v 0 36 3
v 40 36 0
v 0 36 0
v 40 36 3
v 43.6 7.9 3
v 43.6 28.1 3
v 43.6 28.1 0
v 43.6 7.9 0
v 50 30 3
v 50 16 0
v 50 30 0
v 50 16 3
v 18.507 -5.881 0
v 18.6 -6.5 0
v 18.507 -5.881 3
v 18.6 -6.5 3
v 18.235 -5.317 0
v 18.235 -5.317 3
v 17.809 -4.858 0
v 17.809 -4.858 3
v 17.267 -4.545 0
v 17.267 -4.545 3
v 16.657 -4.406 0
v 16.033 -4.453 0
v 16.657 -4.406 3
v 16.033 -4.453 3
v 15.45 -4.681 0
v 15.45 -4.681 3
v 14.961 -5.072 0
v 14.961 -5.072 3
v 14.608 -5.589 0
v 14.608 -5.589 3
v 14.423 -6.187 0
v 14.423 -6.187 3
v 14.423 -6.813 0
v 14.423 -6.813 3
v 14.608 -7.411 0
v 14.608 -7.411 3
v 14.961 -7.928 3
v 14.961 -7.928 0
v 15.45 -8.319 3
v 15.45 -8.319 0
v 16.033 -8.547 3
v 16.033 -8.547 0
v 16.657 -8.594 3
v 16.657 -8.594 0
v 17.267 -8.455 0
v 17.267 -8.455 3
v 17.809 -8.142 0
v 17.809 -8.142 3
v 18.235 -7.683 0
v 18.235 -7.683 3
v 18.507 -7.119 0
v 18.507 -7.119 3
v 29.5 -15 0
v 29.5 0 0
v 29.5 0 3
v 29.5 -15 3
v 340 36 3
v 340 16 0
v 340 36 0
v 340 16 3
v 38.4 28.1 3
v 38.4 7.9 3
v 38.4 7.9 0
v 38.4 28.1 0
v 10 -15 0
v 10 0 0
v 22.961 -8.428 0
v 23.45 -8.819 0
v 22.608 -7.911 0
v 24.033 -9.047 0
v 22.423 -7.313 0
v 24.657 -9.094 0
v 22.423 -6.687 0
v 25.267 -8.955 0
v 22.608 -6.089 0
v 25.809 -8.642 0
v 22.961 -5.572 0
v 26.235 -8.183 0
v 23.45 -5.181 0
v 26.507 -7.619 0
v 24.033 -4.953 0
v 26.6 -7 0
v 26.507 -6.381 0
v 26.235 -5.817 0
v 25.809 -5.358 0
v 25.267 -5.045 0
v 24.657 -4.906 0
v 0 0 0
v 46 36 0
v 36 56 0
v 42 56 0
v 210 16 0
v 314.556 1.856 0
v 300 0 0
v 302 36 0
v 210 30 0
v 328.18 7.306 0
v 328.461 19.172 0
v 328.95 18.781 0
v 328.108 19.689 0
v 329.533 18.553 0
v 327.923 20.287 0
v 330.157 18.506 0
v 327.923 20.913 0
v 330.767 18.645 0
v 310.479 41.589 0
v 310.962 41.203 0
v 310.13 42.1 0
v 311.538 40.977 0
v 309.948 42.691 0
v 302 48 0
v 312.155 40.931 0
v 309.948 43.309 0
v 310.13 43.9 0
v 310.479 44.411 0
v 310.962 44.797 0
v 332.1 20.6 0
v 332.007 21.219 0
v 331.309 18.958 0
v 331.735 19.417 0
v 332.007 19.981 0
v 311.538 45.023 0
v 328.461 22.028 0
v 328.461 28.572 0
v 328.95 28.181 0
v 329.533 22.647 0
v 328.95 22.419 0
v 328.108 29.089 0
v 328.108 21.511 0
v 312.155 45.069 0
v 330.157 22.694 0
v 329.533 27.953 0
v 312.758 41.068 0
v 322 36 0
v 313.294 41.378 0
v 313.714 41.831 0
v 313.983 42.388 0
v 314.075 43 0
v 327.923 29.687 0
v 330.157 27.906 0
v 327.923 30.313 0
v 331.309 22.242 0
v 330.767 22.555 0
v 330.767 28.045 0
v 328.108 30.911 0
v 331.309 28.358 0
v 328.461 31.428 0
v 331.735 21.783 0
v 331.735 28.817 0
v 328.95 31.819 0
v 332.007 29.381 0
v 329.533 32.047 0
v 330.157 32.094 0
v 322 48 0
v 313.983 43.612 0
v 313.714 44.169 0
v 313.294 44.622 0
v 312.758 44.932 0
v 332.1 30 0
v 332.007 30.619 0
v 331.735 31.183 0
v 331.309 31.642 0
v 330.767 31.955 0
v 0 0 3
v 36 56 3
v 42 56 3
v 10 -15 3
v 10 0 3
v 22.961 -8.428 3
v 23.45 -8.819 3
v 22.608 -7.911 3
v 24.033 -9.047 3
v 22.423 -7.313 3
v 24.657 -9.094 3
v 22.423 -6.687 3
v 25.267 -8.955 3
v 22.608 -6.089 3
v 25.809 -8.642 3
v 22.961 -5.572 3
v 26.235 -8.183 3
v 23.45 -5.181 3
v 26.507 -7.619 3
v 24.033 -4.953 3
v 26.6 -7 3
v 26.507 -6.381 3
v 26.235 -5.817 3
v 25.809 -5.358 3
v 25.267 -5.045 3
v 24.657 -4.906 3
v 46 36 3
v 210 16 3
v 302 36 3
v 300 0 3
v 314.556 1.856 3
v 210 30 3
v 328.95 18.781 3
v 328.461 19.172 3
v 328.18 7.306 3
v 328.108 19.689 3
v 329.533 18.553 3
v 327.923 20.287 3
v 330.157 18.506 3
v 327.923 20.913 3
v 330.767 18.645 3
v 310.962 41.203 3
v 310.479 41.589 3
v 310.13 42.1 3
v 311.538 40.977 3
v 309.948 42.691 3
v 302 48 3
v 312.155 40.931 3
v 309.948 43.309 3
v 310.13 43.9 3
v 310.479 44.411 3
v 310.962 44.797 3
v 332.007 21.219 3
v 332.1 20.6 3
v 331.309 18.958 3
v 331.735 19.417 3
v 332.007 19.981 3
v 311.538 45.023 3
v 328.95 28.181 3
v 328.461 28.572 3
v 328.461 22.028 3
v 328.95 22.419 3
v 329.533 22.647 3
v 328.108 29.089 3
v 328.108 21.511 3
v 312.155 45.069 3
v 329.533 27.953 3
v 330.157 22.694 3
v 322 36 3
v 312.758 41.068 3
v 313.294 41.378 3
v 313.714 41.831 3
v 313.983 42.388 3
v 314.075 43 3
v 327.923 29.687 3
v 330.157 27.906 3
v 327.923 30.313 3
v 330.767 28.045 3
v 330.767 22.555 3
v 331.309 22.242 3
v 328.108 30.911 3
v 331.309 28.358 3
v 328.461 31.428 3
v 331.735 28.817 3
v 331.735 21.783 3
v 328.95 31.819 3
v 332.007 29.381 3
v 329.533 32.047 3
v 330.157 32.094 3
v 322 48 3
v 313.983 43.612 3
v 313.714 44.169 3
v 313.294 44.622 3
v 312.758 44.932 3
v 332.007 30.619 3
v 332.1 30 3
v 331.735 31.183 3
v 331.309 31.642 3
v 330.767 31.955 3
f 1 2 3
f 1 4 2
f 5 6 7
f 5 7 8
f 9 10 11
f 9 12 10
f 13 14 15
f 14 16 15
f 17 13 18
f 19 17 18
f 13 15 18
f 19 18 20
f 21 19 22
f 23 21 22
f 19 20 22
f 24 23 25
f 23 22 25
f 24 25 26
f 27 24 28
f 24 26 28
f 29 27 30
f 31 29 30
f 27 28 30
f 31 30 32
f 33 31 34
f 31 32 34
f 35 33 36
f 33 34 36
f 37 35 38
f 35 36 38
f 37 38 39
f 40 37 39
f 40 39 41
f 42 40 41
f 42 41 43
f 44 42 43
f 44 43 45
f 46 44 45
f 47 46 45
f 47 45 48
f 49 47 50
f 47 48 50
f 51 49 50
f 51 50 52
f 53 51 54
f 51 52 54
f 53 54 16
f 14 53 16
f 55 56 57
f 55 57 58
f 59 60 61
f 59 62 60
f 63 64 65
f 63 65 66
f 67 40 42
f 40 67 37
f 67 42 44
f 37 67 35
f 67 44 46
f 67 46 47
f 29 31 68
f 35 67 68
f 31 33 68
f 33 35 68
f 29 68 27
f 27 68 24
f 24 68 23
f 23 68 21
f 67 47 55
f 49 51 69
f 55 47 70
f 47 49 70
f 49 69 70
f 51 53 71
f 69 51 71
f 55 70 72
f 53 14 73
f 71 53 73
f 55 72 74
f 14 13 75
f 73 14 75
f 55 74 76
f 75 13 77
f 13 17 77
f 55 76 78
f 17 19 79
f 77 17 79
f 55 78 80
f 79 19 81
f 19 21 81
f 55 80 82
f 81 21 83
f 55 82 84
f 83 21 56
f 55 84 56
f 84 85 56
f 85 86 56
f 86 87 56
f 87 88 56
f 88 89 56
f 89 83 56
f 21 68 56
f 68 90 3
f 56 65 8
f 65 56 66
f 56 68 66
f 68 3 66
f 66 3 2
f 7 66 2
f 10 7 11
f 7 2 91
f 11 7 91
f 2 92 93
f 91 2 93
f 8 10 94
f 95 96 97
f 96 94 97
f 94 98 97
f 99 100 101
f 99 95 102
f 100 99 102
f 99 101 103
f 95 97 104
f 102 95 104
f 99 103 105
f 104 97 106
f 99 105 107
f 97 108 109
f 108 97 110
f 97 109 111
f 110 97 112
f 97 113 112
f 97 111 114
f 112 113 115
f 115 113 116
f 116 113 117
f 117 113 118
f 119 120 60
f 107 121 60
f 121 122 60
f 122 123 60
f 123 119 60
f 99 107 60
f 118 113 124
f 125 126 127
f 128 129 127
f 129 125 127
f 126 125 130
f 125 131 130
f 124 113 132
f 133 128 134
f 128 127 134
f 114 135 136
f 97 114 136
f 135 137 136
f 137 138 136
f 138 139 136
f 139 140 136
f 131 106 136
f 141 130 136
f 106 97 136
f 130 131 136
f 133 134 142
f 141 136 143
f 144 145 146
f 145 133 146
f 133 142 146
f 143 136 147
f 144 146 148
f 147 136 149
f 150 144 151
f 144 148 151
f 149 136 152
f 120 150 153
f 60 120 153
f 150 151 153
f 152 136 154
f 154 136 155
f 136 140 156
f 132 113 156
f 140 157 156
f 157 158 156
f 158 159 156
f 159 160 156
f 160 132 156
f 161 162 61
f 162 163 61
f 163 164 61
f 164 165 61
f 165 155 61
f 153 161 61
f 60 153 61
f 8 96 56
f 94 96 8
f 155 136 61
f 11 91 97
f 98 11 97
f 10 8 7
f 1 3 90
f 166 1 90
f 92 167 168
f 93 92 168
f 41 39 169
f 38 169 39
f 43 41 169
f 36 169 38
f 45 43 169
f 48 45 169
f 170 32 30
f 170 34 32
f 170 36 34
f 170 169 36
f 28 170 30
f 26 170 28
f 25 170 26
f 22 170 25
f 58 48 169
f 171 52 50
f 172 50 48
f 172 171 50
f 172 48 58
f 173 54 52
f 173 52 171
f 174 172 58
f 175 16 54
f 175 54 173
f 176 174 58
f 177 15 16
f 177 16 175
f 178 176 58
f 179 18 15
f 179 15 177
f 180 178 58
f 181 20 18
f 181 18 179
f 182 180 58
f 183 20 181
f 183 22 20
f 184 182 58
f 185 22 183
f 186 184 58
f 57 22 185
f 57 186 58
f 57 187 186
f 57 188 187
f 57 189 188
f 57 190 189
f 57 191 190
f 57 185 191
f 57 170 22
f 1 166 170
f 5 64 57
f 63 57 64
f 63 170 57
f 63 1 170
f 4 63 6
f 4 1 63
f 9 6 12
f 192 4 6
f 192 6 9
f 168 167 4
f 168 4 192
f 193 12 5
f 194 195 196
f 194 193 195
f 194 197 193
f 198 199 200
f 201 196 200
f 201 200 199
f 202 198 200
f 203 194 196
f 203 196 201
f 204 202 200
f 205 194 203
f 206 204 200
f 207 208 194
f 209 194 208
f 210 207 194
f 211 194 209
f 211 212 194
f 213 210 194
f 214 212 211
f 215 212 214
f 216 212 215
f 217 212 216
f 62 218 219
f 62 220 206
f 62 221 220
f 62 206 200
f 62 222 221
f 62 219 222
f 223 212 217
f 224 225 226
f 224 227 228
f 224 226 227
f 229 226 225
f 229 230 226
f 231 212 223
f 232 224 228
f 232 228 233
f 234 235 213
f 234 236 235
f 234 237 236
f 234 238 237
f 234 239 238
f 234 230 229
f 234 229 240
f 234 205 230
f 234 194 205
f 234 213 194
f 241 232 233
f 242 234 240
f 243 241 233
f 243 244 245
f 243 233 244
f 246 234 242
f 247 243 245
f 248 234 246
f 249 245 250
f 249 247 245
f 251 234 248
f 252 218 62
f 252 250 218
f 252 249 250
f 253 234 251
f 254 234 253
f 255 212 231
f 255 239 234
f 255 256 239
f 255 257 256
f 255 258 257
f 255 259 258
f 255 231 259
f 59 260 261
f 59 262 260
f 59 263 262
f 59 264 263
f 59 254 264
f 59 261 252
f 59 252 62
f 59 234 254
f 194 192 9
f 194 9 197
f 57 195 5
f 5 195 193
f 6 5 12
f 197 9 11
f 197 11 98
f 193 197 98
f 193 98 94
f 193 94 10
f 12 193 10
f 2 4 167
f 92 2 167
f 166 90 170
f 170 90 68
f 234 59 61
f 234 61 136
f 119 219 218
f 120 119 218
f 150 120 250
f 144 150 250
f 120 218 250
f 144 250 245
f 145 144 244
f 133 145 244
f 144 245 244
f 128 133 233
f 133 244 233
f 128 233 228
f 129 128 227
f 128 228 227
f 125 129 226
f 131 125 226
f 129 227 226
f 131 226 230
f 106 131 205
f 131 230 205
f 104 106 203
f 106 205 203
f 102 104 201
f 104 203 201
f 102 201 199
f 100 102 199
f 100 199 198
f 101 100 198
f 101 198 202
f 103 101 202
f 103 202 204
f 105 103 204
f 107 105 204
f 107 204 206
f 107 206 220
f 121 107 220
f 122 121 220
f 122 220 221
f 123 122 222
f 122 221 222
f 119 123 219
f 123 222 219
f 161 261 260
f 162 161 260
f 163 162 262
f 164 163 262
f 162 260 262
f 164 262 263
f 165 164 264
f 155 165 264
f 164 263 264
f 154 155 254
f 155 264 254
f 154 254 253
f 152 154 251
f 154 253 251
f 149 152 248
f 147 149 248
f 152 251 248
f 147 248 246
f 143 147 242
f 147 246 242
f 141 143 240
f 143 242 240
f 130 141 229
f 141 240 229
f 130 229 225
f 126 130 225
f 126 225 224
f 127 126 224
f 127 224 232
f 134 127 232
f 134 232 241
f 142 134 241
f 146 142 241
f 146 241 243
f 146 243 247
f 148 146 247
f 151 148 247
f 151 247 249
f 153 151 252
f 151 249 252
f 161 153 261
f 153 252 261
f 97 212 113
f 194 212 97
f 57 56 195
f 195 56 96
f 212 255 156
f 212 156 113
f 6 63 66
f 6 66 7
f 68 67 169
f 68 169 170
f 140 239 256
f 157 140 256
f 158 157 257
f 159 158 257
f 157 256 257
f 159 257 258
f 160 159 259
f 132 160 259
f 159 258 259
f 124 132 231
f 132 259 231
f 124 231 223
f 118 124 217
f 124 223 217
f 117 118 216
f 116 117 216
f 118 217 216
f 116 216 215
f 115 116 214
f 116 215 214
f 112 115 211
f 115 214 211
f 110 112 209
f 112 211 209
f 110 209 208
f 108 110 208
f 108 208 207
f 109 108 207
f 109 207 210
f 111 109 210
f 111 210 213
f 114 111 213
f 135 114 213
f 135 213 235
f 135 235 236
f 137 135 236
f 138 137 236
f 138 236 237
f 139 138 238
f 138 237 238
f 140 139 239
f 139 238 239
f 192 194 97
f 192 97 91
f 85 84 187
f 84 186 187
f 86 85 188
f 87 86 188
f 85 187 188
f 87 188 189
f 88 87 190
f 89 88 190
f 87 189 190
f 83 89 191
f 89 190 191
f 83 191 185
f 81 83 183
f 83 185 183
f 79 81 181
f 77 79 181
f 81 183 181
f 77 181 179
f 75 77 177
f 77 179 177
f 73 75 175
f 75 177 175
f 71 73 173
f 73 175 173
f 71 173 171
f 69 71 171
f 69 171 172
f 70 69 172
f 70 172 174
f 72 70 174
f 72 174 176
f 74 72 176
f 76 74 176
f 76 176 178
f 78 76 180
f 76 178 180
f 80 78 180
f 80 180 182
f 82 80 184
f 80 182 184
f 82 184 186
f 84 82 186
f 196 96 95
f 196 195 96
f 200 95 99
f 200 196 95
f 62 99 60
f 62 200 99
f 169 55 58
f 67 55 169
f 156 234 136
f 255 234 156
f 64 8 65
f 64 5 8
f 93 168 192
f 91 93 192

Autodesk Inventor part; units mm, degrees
ref_plane "YZ Plane" through (0, 0, 0) normal (1, 0, 0) x (0, 1, 0)
ref_plane "XZ Plane" through (0, 0, 0) normal (0, 1, 0) x (-1, 0, 0)
ref_plane "XY Plane" through (0, 0, 0) normal (0, 0, 1) x (1, 0, 0)
sketch "Sketch1" plane through (0, 0, 0) normal (0, 0, 1) x (1, 0, 0)
  line L0 (0, 0) -> (300, 0)
  line L1 (300, 0) -> (300, 16)
  line L2 (300, 16) -> (0, 16)
  line L3 (0, 16) -> (0, 0)
  line L4 (0, 0) -> (22.0483, 0)
  line L5 (10, 0) -> (29.5, 0)
  line L6 (29.5, 0) -> (29.5, -15)
  line L7 (29.5, -15) -> (10, -15)
  line L8 (10, -15) -> (10, 0)
  point P0 (0, 8)
  dimension "d2" = 19.5
  dimension "d3" = 15
  dimension "d4" = 10
  dimension "d5" = 16
  dimension "d8" = 300
extrude "Extrusion1" add sketch "Sketch1" along normal blind 3
sketch "Sketch2" plane through (0, 0, 3) normal (0, 0, 1) x (1, 0, 0)
  line L0 (0, 16) -> (0, 0) projected
  line L1 (0, 16) -> (0, 36)
  line L2 (300, 0) -> (300, 16) projected
  line L3 (340, 16) -> (340, 36)
  line L4 (340, 36) -> (0, 36)
  line L5 (300, 16) -> (0, 16) projected
  line L6 (50, 16) -> (50, 30)
  line L7 (50, 30) -> (210, 30)
  line L8 (210, 30) -> (210, 16)
  line L9 (40, 36) -> (36, 56)
  line L10 (36, 56) -> (42, 56)
  line L11 (42, 56) -> (46, 36)
  circle A0 centre (330, 30) radius 2.1
  circle A1 centre (330, 20.6) radius 2.1
  line L12 (340, 16) -> (300, 16)
  line L13 (302, 36) -> (322, 36)
  line L14 (322, 36) -> (322, 48)
  line L15 (322, 48) -> (302, 48)
  line L16 (302, 48) -> (302, 36)
  circle A2 centre (312, 43) radius 2.075
  point P0 (312, 48)
  point P1 (322, 36)
  dimension "d44" = 20
  dimension "d45" = 160
  dimension "d46" = 50
  dimension "d47" = 14
  dimension "d48" = 20
  dimension "d49" = 6
  dimension "d50" = 4
  dimension "d51" = 40
  dimension "d83" = 4.2
  dimension "d84" = 4.2
  dimension "d85" = 6
  dimension "d86" = 9.4
  dimension "d87" = 10
  dimension "d99" = 40
  dimension "d107" = 7
  dimension "d108" = 20
  dimension "d109" = 12
  dimension "d110" = 18
  dimension "d111" = 4.15
extrude "Extrusion2" add sketch "Sketch2" against normal blind 3 contours L1 L4 L3 L12 L5 L8 L7 L6 | L9 L10 L11 L4 | L16 L15 L14 L4
sketch "Sketch3" plane through (0, 0, 3) normal (0, 0, 1) x (1, 0, 0)
  circle A0 centre (16.5, -6.5) radius 2.1
  circle A1 centre (24.5, -7) radius 2.1
  line L0 (29.5, 0) -> (300, 0) projected
  line L1 (29.5, -15) -> (29.5, 0) projected
  point P0 (0, 0)
  dimension "d75" = 4.2
  dimension "d76" = 6.5
  dimension "d77" = 4.2
  dimension "d78" = 7
  dimension "d79" = 5
  dimension "d80" = 8
extrude "Extrusion3" cut sketch "Sketch3" against normal blind 3
sketch "Sketch4" plane through (0, 0, 3) normal (0, 0, 1) x (1, 0, 0)
  line L0 (29.5, 0) -> (300, 0) projected
  circle A0 centre (41, 18) radius 2.6
  line L1 (340, 36) -> (46, 36) projected
  line L2 (38.4, 28.1) -> (43.6, 28.1)
  line L3 (43.6, 28.1) -> (43.6, 7.9)
  line L4 (43.6, 7.9) -> (38.4, 7.9)
  line L5 (38.4, 7.9) -> (38.4, 28.1)
  line L6 (38.4, 28.1) -> (43.6, 7.9) construction
  line L7 (43.6, 28.1) -> (38.4, 7.9) construction
  point P0 (0, 0)
  point P1 (43.6, 18)
  point P2 (38.4, 18)
  dimension "d95" = 18
  dimension "d96" = 5.2
  dimension "d100" = 5
  dimension "d101" = 20.2
extrude "Extrusion4" cut sketch "Sketch4" against normal blind 3
sketch "Sketch5" plane through (0, 0, 3) normal (0, 0, 1) x (1, 0, 0)
  line L0 (29.5, 0) -> (300, 0) projected
  line L1 (340, 36) -> (340, 16) projected
  arc A0 (300, 0) -> (340, 16) centre (300, 58) ccw
  line L2 (300, 0) -> (300, 16) projected
  line L3 (300, 0) -> (300, 16)
  line L4 (300, 16) -> (340, 16)
  point P0 (0, 0)
extrude "Extrusion5" add sketch "Sketch5" against normal blind 3
properties part number "Middle_bar"
